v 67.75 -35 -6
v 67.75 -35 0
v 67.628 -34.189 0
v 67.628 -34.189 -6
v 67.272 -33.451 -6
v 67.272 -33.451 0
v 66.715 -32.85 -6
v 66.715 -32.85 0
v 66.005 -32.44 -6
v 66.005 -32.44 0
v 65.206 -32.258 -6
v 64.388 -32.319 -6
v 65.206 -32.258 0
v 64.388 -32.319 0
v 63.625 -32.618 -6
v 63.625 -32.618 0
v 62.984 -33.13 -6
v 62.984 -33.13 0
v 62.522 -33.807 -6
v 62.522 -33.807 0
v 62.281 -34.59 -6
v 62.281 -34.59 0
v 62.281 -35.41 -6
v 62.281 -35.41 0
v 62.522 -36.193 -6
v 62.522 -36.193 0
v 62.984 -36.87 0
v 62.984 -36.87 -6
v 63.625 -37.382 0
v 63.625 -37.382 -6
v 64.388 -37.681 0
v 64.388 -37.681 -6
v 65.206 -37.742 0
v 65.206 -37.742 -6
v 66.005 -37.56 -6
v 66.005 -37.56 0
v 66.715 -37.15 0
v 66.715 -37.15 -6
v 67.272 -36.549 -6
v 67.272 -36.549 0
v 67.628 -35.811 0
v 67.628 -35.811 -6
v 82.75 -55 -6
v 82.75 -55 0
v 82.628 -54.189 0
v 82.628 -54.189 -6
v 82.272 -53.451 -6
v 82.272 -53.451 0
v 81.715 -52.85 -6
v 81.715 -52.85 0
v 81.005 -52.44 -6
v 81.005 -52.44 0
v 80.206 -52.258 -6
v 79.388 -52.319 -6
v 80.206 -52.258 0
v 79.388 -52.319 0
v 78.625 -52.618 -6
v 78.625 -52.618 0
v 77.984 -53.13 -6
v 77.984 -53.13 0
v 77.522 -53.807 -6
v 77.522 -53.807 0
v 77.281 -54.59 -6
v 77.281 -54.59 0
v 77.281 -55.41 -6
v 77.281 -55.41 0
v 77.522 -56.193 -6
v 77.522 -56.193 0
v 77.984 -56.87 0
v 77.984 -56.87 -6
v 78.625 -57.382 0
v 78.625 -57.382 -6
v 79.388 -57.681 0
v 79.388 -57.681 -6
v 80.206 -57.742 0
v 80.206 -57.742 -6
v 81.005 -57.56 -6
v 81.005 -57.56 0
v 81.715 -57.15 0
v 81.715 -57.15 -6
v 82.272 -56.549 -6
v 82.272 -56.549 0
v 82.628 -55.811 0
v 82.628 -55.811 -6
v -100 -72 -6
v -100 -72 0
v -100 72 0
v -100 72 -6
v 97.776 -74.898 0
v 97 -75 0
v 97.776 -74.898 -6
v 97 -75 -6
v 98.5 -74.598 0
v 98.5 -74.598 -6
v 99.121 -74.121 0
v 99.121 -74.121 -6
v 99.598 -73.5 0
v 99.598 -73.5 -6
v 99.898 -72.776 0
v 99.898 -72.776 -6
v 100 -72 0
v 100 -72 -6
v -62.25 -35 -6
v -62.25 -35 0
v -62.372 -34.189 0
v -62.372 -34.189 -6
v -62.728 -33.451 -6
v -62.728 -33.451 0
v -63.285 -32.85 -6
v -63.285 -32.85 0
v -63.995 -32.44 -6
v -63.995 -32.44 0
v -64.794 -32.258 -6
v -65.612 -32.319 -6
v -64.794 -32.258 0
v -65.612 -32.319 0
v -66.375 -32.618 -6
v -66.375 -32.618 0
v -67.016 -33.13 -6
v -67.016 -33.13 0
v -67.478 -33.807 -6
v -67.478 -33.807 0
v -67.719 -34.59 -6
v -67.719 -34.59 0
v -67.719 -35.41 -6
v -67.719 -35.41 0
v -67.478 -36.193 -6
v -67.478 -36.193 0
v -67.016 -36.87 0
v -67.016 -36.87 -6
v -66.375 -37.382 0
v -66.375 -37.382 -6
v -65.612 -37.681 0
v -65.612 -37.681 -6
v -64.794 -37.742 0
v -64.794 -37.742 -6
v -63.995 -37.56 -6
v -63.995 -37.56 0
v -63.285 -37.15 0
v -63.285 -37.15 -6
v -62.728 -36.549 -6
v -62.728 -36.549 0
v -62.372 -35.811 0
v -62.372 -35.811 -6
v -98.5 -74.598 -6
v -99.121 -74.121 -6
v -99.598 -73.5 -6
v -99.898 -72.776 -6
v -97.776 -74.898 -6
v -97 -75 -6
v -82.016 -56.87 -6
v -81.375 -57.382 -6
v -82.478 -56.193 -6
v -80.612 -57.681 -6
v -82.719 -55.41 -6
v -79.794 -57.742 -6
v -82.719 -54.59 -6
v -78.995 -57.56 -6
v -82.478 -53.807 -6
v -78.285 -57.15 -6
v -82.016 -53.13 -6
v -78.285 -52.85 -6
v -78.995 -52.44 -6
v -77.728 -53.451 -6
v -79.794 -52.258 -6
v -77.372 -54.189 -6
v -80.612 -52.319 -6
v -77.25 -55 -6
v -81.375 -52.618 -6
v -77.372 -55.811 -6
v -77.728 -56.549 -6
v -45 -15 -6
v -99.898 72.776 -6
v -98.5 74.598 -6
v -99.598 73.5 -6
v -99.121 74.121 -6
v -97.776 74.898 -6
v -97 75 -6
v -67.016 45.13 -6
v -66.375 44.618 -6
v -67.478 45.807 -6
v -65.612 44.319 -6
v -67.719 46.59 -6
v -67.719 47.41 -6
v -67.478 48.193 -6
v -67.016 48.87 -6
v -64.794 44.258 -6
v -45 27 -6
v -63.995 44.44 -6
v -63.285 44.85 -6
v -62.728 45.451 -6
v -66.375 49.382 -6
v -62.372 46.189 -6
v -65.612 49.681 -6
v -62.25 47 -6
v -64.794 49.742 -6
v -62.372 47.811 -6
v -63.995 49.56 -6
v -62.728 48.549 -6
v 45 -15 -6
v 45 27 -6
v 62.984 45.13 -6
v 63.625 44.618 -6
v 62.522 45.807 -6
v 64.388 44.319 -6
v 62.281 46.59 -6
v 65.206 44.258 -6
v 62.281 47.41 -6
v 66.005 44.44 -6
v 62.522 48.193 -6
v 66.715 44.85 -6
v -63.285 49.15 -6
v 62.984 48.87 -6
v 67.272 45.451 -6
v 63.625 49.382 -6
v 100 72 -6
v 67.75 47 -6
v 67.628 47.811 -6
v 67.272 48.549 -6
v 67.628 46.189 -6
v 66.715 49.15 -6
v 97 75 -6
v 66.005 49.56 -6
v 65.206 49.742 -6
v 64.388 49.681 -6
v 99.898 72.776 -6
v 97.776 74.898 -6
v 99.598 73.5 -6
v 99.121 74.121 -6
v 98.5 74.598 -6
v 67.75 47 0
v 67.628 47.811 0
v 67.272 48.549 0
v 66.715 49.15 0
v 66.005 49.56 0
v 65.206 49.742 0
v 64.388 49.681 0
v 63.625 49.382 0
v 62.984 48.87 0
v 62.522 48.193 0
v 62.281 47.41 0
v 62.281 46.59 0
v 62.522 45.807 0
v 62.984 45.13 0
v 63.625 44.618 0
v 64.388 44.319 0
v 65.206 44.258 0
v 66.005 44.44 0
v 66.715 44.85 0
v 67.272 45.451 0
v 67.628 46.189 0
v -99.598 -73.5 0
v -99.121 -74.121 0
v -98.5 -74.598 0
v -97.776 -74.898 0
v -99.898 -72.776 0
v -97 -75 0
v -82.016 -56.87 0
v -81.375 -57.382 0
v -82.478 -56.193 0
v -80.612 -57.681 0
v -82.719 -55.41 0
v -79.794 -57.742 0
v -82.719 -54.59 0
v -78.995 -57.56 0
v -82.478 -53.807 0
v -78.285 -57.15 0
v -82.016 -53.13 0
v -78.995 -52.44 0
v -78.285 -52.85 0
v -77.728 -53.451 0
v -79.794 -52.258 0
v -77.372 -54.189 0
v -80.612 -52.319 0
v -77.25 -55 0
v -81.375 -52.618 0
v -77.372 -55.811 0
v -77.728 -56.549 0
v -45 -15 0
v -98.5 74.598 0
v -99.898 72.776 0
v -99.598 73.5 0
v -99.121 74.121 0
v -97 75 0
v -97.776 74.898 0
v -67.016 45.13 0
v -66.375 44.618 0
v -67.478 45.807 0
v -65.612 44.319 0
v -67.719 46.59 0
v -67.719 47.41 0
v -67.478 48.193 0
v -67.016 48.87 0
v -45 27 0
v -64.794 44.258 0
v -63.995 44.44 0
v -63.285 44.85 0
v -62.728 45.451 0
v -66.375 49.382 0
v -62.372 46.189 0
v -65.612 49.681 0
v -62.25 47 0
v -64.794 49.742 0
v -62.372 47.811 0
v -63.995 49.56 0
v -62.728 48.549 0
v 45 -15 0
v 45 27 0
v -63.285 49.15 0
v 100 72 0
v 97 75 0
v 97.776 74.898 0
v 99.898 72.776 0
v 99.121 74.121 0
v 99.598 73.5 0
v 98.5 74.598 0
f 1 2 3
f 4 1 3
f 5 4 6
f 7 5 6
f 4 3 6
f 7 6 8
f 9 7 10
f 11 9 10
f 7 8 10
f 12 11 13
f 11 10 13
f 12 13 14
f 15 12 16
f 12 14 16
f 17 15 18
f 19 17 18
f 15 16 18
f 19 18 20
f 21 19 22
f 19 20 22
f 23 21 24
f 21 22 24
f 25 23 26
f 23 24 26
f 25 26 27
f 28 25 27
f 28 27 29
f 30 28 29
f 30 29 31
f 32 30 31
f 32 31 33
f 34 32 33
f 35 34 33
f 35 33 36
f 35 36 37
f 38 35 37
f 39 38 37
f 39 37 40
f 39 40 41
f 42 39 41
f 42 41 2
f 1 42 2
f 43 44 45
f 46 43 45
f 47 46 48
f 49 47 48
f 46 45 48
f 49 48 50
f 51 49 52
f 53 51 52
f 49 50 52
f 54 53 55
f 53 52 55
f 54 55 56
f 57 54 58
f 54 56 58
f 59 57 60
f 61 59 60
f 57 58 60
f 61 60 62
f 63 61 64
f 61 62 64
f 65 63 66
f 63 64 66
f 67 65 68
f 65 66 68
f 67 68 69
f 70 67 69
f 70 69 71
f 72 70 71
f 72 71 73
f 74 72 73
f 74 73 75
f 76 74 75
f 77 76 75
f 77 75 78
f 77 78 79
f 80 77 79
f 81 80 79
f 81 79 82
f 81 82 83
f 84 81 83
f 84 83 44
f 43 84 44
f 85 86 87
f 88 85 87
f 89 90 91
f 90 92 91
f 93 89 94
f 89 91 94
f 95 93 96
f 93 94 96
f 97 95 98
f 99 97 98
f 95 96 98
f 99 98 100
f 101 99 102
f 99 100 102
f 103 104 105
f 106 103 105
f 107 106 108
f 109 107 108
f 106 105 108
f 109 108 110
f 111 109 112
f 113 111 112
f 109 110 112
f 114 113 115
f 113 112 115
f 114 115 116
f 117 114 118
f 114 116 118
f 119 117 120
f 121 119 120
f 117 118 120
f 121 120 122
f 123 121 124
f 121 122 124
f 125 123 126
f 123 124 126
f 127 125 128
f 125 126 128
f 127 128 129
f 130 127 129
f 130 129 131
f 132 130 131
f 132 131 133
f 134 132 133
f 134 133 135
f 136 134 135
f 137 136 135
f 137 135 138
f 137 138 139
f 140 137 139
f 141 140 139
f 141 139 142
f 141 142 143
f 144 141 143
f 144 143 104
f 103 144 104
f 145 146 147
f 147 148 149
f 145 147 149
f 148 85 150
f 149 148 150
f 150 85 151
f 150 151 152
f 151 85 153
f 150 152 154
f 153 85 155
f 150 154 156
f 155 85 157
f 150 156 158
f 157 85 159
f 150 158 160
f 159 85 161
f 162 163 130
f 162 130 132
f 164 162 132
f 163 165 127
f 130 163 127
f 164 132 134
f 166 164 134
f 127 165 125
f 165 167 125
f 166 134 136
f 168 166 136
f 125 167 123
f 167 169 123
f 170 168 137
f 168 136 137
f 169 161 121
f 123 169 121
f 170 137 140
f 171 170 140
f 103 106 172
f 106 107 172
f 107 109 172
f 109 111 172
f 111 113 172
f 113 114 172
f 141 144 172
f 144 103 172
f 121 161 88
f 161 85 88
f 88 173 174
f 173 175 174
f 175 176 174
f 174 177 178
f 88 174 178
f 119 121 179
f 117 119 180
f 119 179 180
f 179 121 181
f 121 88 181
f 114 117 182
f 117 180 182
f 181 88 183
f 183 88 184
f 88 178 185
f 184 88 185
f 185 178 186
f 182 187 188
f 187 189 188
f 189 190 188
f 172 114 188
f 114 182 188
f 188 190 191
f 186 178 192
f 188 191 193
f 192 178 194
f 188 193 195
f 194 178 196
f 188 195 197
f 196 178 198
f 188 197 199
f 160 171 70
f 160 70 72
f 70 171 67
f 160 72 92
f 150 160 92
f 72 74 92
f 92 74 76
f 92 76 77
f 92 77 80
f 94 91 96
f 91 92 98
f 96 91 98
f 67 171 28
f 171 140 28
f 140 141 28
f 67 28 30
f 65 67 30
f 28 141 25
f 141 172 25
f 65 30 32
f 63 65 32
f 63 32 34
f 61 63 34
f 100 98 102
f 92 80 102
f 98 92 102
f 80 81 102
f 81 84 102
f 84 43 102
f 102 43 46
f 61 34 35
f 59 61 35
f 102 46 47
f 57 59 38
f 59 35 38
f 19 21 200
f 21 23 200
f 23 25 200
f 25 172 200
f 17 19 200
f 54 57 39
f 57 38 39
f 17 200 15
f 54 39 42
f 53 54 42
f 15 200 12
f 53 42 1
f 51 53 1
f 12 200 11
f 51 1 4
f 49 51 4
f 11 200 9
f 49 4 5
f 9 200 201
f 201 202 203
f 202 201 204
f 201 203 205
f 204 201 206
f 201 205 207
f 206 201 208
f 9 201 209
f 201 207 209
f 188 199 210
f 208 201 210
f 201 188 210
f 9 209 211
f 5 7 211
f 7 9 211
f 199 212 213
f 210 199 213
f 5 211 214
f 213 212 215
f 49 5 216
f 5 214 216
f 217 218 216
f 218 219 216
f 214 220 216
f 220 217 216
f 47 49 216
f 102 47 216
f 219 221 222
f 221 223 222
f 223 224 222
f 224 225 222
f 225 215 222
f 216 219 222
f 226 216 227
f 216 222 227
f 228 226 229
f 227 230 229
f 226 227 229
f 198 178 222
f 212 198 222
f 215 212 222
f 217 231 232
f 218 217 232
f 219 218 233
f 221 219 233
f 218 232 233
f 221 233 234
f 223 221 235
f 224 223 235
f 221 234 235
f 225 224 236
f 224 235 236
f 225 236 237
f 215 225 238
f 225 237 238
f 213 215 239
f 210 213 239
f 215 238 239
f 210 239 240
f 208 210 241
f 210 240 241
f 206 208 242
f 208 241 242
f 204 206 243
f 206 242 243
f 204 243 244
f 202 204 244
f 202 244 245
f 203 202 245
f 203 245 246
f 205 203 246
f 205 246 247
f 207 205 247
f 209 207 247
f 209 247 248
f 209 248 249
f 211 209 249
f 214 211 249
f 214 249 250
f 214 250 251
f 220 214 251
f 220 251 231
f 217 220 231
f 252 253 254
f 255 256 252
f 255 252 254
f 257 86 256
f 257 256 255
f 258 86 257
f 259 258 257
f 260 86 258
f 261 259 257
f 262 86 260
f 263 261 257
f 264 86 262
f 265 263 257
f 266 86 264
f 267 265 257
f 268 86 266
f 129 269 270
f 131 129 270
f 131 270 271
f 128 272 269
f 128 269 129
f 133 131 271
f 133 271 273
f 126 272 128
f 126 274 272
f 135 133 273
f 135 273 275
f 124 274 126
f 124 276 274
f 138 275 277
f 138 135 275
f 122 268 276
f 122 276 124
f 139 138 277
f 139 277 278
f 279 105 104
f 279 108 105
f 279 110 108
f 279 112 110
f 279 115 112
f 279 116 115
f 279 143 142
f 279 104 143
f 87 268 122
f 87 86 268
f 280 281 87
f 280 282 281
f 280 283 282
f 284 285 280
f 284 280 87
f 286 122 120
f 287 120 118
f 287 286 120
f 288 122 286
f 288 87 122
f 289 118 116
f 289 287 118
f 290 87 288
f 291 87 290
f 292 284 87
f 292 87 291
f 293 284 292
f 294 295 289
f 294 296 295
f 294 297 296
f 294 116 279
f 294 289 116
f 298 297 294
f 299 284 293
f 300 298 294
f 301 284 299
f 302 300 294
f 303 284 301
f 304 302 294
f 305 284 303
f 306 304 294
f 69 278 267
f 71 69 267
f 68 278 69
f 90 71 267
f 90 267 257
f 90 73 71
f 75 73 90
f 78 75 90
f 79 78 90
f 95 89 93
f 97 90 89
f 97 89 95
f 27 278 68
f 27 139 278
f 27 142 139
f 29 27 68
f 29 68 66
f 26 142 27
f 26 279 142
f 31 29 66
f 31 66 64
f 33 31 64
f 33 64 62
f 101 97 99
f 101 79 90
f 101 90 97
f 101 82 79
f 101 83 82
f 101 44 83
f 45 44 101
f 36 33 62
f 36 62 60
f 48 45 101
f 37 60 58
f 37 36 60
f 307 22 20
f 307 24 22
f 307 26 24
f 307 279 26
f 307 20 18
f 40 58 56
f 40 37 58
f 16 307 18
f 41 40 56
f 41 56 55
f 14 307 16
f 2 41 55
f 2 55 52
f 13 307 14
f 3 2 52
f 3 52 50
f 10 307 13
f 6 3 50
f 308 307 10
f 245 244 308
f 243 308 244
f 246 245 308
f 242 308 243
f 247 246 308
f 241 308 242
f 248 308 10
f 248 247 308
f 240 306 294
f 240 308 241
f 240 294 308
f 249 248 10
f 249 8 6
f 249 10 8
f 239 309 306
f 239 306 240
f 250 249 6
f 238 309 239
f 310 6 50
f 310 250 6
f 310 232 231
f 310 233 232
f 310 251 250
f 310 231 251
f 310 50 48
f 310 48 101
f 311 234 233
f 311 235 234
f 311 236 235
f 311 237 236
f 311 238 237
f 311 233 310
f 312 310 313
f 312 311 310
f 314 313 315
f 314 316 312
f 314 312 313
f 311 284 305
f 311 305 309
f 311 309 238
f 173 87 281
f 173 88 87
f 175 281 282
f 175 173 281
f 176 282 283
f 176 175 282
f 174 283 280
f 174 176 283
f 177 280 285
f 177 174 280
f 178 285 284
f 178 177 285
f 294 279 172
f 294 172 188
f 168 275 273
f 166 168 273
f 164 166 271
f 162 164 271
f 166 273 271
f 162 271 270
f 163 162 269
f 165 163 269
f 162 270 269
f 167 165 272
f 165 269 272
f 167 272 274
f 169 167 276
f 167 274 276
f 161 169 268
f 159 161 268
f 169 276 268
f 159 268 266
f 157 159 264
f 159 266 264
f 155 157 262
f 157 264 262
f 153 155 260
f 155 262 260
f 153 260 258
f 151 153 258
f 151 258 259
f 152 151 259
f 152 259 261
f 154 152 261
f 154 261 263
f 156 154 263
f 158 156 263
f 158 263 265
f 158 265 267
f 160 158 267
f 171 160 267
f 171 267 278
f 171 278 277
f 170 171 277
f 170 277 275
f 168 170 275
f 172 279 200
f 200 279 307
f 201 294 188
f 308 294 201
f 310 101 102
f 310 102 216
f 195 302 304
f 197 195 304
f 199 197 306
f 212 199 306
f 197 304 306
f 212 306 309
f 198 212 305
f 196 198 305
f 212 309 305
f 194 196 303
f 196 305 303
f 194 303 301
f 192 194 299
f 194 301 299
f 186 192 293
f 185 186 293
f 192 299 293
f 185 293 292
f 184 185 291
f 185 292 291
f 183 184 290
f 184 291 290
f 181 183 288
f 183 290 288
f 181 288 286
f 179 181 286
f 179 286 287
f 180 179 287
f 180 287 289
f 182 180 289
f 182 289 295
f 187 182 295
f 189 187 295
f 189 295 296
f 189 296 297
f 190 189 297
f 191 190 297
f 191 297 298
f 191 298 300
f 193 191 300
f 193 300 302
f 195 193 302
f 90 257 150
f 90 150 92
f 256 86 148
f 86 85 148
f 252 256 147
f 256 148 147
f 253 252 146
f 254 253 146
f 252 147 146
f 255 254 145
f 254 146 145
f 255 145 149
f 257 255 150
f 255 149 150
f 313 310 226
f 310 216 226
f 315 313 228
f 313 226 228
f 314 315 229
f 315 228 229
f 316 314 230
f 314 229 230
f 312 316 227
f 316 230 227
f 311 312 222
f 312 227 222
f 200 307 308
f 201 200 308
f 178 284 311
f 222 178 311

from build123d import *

# Parameters (mm, degrees)
SKETCH_W     = 200
SKETCH_H     = 150
PAD_DEPTH    = 6
FILLET_R     = 3
SKETCH001_R  = 2.75
SKETCH001_W  = 90
SKETCH001_H  = 42
POCKET_DEPTH = 6.001


with BuildPart() as part:
    # Sketch → Pad (new body)
    with BuildSketch(Plane.XY):
        Rectangle(SKETCH_W, SKETCH_H)
    extrude(amount=-PAD_DEPTH)

    # Fillet
    fillet_edges = [part.edges().sort_by_distance(p)[0] for p in [
        (-100, -75, -3),
        (100, -75, -3),
        (100, 75, -3),
        (-100, 75, -3),
    ]]
    fillet(fillet_edges, radius=FILLET_R)

    # Sketch001 (on Face2 of Fillet) → Pocket (cut, through all)
    with BuildSketch(Plane.XY):
        with Locations((-80, -55)):
            Circle(SKETCH001_R)
        with Locations((80, -55)):
            Circle(SKETCH001_R)
        with Locations((-65, 47)):
            Circle(SKETCH001_R)
        with Locations((65, 47)):
            Circle(SKETCH001_R)
        with Locations((65, -35)):
            Circle(SKETCH001_R)
        with Locations((-65, -35)):
            Circle(SKETCH001_R)
        with Locations((0, 6)):
            Rectangle(SKETCH001_W, SKETCH001_H)
    extrude(amount=-POCKET_DEPTH, mode=Mode.SUBTRACT)


solid = part.part
